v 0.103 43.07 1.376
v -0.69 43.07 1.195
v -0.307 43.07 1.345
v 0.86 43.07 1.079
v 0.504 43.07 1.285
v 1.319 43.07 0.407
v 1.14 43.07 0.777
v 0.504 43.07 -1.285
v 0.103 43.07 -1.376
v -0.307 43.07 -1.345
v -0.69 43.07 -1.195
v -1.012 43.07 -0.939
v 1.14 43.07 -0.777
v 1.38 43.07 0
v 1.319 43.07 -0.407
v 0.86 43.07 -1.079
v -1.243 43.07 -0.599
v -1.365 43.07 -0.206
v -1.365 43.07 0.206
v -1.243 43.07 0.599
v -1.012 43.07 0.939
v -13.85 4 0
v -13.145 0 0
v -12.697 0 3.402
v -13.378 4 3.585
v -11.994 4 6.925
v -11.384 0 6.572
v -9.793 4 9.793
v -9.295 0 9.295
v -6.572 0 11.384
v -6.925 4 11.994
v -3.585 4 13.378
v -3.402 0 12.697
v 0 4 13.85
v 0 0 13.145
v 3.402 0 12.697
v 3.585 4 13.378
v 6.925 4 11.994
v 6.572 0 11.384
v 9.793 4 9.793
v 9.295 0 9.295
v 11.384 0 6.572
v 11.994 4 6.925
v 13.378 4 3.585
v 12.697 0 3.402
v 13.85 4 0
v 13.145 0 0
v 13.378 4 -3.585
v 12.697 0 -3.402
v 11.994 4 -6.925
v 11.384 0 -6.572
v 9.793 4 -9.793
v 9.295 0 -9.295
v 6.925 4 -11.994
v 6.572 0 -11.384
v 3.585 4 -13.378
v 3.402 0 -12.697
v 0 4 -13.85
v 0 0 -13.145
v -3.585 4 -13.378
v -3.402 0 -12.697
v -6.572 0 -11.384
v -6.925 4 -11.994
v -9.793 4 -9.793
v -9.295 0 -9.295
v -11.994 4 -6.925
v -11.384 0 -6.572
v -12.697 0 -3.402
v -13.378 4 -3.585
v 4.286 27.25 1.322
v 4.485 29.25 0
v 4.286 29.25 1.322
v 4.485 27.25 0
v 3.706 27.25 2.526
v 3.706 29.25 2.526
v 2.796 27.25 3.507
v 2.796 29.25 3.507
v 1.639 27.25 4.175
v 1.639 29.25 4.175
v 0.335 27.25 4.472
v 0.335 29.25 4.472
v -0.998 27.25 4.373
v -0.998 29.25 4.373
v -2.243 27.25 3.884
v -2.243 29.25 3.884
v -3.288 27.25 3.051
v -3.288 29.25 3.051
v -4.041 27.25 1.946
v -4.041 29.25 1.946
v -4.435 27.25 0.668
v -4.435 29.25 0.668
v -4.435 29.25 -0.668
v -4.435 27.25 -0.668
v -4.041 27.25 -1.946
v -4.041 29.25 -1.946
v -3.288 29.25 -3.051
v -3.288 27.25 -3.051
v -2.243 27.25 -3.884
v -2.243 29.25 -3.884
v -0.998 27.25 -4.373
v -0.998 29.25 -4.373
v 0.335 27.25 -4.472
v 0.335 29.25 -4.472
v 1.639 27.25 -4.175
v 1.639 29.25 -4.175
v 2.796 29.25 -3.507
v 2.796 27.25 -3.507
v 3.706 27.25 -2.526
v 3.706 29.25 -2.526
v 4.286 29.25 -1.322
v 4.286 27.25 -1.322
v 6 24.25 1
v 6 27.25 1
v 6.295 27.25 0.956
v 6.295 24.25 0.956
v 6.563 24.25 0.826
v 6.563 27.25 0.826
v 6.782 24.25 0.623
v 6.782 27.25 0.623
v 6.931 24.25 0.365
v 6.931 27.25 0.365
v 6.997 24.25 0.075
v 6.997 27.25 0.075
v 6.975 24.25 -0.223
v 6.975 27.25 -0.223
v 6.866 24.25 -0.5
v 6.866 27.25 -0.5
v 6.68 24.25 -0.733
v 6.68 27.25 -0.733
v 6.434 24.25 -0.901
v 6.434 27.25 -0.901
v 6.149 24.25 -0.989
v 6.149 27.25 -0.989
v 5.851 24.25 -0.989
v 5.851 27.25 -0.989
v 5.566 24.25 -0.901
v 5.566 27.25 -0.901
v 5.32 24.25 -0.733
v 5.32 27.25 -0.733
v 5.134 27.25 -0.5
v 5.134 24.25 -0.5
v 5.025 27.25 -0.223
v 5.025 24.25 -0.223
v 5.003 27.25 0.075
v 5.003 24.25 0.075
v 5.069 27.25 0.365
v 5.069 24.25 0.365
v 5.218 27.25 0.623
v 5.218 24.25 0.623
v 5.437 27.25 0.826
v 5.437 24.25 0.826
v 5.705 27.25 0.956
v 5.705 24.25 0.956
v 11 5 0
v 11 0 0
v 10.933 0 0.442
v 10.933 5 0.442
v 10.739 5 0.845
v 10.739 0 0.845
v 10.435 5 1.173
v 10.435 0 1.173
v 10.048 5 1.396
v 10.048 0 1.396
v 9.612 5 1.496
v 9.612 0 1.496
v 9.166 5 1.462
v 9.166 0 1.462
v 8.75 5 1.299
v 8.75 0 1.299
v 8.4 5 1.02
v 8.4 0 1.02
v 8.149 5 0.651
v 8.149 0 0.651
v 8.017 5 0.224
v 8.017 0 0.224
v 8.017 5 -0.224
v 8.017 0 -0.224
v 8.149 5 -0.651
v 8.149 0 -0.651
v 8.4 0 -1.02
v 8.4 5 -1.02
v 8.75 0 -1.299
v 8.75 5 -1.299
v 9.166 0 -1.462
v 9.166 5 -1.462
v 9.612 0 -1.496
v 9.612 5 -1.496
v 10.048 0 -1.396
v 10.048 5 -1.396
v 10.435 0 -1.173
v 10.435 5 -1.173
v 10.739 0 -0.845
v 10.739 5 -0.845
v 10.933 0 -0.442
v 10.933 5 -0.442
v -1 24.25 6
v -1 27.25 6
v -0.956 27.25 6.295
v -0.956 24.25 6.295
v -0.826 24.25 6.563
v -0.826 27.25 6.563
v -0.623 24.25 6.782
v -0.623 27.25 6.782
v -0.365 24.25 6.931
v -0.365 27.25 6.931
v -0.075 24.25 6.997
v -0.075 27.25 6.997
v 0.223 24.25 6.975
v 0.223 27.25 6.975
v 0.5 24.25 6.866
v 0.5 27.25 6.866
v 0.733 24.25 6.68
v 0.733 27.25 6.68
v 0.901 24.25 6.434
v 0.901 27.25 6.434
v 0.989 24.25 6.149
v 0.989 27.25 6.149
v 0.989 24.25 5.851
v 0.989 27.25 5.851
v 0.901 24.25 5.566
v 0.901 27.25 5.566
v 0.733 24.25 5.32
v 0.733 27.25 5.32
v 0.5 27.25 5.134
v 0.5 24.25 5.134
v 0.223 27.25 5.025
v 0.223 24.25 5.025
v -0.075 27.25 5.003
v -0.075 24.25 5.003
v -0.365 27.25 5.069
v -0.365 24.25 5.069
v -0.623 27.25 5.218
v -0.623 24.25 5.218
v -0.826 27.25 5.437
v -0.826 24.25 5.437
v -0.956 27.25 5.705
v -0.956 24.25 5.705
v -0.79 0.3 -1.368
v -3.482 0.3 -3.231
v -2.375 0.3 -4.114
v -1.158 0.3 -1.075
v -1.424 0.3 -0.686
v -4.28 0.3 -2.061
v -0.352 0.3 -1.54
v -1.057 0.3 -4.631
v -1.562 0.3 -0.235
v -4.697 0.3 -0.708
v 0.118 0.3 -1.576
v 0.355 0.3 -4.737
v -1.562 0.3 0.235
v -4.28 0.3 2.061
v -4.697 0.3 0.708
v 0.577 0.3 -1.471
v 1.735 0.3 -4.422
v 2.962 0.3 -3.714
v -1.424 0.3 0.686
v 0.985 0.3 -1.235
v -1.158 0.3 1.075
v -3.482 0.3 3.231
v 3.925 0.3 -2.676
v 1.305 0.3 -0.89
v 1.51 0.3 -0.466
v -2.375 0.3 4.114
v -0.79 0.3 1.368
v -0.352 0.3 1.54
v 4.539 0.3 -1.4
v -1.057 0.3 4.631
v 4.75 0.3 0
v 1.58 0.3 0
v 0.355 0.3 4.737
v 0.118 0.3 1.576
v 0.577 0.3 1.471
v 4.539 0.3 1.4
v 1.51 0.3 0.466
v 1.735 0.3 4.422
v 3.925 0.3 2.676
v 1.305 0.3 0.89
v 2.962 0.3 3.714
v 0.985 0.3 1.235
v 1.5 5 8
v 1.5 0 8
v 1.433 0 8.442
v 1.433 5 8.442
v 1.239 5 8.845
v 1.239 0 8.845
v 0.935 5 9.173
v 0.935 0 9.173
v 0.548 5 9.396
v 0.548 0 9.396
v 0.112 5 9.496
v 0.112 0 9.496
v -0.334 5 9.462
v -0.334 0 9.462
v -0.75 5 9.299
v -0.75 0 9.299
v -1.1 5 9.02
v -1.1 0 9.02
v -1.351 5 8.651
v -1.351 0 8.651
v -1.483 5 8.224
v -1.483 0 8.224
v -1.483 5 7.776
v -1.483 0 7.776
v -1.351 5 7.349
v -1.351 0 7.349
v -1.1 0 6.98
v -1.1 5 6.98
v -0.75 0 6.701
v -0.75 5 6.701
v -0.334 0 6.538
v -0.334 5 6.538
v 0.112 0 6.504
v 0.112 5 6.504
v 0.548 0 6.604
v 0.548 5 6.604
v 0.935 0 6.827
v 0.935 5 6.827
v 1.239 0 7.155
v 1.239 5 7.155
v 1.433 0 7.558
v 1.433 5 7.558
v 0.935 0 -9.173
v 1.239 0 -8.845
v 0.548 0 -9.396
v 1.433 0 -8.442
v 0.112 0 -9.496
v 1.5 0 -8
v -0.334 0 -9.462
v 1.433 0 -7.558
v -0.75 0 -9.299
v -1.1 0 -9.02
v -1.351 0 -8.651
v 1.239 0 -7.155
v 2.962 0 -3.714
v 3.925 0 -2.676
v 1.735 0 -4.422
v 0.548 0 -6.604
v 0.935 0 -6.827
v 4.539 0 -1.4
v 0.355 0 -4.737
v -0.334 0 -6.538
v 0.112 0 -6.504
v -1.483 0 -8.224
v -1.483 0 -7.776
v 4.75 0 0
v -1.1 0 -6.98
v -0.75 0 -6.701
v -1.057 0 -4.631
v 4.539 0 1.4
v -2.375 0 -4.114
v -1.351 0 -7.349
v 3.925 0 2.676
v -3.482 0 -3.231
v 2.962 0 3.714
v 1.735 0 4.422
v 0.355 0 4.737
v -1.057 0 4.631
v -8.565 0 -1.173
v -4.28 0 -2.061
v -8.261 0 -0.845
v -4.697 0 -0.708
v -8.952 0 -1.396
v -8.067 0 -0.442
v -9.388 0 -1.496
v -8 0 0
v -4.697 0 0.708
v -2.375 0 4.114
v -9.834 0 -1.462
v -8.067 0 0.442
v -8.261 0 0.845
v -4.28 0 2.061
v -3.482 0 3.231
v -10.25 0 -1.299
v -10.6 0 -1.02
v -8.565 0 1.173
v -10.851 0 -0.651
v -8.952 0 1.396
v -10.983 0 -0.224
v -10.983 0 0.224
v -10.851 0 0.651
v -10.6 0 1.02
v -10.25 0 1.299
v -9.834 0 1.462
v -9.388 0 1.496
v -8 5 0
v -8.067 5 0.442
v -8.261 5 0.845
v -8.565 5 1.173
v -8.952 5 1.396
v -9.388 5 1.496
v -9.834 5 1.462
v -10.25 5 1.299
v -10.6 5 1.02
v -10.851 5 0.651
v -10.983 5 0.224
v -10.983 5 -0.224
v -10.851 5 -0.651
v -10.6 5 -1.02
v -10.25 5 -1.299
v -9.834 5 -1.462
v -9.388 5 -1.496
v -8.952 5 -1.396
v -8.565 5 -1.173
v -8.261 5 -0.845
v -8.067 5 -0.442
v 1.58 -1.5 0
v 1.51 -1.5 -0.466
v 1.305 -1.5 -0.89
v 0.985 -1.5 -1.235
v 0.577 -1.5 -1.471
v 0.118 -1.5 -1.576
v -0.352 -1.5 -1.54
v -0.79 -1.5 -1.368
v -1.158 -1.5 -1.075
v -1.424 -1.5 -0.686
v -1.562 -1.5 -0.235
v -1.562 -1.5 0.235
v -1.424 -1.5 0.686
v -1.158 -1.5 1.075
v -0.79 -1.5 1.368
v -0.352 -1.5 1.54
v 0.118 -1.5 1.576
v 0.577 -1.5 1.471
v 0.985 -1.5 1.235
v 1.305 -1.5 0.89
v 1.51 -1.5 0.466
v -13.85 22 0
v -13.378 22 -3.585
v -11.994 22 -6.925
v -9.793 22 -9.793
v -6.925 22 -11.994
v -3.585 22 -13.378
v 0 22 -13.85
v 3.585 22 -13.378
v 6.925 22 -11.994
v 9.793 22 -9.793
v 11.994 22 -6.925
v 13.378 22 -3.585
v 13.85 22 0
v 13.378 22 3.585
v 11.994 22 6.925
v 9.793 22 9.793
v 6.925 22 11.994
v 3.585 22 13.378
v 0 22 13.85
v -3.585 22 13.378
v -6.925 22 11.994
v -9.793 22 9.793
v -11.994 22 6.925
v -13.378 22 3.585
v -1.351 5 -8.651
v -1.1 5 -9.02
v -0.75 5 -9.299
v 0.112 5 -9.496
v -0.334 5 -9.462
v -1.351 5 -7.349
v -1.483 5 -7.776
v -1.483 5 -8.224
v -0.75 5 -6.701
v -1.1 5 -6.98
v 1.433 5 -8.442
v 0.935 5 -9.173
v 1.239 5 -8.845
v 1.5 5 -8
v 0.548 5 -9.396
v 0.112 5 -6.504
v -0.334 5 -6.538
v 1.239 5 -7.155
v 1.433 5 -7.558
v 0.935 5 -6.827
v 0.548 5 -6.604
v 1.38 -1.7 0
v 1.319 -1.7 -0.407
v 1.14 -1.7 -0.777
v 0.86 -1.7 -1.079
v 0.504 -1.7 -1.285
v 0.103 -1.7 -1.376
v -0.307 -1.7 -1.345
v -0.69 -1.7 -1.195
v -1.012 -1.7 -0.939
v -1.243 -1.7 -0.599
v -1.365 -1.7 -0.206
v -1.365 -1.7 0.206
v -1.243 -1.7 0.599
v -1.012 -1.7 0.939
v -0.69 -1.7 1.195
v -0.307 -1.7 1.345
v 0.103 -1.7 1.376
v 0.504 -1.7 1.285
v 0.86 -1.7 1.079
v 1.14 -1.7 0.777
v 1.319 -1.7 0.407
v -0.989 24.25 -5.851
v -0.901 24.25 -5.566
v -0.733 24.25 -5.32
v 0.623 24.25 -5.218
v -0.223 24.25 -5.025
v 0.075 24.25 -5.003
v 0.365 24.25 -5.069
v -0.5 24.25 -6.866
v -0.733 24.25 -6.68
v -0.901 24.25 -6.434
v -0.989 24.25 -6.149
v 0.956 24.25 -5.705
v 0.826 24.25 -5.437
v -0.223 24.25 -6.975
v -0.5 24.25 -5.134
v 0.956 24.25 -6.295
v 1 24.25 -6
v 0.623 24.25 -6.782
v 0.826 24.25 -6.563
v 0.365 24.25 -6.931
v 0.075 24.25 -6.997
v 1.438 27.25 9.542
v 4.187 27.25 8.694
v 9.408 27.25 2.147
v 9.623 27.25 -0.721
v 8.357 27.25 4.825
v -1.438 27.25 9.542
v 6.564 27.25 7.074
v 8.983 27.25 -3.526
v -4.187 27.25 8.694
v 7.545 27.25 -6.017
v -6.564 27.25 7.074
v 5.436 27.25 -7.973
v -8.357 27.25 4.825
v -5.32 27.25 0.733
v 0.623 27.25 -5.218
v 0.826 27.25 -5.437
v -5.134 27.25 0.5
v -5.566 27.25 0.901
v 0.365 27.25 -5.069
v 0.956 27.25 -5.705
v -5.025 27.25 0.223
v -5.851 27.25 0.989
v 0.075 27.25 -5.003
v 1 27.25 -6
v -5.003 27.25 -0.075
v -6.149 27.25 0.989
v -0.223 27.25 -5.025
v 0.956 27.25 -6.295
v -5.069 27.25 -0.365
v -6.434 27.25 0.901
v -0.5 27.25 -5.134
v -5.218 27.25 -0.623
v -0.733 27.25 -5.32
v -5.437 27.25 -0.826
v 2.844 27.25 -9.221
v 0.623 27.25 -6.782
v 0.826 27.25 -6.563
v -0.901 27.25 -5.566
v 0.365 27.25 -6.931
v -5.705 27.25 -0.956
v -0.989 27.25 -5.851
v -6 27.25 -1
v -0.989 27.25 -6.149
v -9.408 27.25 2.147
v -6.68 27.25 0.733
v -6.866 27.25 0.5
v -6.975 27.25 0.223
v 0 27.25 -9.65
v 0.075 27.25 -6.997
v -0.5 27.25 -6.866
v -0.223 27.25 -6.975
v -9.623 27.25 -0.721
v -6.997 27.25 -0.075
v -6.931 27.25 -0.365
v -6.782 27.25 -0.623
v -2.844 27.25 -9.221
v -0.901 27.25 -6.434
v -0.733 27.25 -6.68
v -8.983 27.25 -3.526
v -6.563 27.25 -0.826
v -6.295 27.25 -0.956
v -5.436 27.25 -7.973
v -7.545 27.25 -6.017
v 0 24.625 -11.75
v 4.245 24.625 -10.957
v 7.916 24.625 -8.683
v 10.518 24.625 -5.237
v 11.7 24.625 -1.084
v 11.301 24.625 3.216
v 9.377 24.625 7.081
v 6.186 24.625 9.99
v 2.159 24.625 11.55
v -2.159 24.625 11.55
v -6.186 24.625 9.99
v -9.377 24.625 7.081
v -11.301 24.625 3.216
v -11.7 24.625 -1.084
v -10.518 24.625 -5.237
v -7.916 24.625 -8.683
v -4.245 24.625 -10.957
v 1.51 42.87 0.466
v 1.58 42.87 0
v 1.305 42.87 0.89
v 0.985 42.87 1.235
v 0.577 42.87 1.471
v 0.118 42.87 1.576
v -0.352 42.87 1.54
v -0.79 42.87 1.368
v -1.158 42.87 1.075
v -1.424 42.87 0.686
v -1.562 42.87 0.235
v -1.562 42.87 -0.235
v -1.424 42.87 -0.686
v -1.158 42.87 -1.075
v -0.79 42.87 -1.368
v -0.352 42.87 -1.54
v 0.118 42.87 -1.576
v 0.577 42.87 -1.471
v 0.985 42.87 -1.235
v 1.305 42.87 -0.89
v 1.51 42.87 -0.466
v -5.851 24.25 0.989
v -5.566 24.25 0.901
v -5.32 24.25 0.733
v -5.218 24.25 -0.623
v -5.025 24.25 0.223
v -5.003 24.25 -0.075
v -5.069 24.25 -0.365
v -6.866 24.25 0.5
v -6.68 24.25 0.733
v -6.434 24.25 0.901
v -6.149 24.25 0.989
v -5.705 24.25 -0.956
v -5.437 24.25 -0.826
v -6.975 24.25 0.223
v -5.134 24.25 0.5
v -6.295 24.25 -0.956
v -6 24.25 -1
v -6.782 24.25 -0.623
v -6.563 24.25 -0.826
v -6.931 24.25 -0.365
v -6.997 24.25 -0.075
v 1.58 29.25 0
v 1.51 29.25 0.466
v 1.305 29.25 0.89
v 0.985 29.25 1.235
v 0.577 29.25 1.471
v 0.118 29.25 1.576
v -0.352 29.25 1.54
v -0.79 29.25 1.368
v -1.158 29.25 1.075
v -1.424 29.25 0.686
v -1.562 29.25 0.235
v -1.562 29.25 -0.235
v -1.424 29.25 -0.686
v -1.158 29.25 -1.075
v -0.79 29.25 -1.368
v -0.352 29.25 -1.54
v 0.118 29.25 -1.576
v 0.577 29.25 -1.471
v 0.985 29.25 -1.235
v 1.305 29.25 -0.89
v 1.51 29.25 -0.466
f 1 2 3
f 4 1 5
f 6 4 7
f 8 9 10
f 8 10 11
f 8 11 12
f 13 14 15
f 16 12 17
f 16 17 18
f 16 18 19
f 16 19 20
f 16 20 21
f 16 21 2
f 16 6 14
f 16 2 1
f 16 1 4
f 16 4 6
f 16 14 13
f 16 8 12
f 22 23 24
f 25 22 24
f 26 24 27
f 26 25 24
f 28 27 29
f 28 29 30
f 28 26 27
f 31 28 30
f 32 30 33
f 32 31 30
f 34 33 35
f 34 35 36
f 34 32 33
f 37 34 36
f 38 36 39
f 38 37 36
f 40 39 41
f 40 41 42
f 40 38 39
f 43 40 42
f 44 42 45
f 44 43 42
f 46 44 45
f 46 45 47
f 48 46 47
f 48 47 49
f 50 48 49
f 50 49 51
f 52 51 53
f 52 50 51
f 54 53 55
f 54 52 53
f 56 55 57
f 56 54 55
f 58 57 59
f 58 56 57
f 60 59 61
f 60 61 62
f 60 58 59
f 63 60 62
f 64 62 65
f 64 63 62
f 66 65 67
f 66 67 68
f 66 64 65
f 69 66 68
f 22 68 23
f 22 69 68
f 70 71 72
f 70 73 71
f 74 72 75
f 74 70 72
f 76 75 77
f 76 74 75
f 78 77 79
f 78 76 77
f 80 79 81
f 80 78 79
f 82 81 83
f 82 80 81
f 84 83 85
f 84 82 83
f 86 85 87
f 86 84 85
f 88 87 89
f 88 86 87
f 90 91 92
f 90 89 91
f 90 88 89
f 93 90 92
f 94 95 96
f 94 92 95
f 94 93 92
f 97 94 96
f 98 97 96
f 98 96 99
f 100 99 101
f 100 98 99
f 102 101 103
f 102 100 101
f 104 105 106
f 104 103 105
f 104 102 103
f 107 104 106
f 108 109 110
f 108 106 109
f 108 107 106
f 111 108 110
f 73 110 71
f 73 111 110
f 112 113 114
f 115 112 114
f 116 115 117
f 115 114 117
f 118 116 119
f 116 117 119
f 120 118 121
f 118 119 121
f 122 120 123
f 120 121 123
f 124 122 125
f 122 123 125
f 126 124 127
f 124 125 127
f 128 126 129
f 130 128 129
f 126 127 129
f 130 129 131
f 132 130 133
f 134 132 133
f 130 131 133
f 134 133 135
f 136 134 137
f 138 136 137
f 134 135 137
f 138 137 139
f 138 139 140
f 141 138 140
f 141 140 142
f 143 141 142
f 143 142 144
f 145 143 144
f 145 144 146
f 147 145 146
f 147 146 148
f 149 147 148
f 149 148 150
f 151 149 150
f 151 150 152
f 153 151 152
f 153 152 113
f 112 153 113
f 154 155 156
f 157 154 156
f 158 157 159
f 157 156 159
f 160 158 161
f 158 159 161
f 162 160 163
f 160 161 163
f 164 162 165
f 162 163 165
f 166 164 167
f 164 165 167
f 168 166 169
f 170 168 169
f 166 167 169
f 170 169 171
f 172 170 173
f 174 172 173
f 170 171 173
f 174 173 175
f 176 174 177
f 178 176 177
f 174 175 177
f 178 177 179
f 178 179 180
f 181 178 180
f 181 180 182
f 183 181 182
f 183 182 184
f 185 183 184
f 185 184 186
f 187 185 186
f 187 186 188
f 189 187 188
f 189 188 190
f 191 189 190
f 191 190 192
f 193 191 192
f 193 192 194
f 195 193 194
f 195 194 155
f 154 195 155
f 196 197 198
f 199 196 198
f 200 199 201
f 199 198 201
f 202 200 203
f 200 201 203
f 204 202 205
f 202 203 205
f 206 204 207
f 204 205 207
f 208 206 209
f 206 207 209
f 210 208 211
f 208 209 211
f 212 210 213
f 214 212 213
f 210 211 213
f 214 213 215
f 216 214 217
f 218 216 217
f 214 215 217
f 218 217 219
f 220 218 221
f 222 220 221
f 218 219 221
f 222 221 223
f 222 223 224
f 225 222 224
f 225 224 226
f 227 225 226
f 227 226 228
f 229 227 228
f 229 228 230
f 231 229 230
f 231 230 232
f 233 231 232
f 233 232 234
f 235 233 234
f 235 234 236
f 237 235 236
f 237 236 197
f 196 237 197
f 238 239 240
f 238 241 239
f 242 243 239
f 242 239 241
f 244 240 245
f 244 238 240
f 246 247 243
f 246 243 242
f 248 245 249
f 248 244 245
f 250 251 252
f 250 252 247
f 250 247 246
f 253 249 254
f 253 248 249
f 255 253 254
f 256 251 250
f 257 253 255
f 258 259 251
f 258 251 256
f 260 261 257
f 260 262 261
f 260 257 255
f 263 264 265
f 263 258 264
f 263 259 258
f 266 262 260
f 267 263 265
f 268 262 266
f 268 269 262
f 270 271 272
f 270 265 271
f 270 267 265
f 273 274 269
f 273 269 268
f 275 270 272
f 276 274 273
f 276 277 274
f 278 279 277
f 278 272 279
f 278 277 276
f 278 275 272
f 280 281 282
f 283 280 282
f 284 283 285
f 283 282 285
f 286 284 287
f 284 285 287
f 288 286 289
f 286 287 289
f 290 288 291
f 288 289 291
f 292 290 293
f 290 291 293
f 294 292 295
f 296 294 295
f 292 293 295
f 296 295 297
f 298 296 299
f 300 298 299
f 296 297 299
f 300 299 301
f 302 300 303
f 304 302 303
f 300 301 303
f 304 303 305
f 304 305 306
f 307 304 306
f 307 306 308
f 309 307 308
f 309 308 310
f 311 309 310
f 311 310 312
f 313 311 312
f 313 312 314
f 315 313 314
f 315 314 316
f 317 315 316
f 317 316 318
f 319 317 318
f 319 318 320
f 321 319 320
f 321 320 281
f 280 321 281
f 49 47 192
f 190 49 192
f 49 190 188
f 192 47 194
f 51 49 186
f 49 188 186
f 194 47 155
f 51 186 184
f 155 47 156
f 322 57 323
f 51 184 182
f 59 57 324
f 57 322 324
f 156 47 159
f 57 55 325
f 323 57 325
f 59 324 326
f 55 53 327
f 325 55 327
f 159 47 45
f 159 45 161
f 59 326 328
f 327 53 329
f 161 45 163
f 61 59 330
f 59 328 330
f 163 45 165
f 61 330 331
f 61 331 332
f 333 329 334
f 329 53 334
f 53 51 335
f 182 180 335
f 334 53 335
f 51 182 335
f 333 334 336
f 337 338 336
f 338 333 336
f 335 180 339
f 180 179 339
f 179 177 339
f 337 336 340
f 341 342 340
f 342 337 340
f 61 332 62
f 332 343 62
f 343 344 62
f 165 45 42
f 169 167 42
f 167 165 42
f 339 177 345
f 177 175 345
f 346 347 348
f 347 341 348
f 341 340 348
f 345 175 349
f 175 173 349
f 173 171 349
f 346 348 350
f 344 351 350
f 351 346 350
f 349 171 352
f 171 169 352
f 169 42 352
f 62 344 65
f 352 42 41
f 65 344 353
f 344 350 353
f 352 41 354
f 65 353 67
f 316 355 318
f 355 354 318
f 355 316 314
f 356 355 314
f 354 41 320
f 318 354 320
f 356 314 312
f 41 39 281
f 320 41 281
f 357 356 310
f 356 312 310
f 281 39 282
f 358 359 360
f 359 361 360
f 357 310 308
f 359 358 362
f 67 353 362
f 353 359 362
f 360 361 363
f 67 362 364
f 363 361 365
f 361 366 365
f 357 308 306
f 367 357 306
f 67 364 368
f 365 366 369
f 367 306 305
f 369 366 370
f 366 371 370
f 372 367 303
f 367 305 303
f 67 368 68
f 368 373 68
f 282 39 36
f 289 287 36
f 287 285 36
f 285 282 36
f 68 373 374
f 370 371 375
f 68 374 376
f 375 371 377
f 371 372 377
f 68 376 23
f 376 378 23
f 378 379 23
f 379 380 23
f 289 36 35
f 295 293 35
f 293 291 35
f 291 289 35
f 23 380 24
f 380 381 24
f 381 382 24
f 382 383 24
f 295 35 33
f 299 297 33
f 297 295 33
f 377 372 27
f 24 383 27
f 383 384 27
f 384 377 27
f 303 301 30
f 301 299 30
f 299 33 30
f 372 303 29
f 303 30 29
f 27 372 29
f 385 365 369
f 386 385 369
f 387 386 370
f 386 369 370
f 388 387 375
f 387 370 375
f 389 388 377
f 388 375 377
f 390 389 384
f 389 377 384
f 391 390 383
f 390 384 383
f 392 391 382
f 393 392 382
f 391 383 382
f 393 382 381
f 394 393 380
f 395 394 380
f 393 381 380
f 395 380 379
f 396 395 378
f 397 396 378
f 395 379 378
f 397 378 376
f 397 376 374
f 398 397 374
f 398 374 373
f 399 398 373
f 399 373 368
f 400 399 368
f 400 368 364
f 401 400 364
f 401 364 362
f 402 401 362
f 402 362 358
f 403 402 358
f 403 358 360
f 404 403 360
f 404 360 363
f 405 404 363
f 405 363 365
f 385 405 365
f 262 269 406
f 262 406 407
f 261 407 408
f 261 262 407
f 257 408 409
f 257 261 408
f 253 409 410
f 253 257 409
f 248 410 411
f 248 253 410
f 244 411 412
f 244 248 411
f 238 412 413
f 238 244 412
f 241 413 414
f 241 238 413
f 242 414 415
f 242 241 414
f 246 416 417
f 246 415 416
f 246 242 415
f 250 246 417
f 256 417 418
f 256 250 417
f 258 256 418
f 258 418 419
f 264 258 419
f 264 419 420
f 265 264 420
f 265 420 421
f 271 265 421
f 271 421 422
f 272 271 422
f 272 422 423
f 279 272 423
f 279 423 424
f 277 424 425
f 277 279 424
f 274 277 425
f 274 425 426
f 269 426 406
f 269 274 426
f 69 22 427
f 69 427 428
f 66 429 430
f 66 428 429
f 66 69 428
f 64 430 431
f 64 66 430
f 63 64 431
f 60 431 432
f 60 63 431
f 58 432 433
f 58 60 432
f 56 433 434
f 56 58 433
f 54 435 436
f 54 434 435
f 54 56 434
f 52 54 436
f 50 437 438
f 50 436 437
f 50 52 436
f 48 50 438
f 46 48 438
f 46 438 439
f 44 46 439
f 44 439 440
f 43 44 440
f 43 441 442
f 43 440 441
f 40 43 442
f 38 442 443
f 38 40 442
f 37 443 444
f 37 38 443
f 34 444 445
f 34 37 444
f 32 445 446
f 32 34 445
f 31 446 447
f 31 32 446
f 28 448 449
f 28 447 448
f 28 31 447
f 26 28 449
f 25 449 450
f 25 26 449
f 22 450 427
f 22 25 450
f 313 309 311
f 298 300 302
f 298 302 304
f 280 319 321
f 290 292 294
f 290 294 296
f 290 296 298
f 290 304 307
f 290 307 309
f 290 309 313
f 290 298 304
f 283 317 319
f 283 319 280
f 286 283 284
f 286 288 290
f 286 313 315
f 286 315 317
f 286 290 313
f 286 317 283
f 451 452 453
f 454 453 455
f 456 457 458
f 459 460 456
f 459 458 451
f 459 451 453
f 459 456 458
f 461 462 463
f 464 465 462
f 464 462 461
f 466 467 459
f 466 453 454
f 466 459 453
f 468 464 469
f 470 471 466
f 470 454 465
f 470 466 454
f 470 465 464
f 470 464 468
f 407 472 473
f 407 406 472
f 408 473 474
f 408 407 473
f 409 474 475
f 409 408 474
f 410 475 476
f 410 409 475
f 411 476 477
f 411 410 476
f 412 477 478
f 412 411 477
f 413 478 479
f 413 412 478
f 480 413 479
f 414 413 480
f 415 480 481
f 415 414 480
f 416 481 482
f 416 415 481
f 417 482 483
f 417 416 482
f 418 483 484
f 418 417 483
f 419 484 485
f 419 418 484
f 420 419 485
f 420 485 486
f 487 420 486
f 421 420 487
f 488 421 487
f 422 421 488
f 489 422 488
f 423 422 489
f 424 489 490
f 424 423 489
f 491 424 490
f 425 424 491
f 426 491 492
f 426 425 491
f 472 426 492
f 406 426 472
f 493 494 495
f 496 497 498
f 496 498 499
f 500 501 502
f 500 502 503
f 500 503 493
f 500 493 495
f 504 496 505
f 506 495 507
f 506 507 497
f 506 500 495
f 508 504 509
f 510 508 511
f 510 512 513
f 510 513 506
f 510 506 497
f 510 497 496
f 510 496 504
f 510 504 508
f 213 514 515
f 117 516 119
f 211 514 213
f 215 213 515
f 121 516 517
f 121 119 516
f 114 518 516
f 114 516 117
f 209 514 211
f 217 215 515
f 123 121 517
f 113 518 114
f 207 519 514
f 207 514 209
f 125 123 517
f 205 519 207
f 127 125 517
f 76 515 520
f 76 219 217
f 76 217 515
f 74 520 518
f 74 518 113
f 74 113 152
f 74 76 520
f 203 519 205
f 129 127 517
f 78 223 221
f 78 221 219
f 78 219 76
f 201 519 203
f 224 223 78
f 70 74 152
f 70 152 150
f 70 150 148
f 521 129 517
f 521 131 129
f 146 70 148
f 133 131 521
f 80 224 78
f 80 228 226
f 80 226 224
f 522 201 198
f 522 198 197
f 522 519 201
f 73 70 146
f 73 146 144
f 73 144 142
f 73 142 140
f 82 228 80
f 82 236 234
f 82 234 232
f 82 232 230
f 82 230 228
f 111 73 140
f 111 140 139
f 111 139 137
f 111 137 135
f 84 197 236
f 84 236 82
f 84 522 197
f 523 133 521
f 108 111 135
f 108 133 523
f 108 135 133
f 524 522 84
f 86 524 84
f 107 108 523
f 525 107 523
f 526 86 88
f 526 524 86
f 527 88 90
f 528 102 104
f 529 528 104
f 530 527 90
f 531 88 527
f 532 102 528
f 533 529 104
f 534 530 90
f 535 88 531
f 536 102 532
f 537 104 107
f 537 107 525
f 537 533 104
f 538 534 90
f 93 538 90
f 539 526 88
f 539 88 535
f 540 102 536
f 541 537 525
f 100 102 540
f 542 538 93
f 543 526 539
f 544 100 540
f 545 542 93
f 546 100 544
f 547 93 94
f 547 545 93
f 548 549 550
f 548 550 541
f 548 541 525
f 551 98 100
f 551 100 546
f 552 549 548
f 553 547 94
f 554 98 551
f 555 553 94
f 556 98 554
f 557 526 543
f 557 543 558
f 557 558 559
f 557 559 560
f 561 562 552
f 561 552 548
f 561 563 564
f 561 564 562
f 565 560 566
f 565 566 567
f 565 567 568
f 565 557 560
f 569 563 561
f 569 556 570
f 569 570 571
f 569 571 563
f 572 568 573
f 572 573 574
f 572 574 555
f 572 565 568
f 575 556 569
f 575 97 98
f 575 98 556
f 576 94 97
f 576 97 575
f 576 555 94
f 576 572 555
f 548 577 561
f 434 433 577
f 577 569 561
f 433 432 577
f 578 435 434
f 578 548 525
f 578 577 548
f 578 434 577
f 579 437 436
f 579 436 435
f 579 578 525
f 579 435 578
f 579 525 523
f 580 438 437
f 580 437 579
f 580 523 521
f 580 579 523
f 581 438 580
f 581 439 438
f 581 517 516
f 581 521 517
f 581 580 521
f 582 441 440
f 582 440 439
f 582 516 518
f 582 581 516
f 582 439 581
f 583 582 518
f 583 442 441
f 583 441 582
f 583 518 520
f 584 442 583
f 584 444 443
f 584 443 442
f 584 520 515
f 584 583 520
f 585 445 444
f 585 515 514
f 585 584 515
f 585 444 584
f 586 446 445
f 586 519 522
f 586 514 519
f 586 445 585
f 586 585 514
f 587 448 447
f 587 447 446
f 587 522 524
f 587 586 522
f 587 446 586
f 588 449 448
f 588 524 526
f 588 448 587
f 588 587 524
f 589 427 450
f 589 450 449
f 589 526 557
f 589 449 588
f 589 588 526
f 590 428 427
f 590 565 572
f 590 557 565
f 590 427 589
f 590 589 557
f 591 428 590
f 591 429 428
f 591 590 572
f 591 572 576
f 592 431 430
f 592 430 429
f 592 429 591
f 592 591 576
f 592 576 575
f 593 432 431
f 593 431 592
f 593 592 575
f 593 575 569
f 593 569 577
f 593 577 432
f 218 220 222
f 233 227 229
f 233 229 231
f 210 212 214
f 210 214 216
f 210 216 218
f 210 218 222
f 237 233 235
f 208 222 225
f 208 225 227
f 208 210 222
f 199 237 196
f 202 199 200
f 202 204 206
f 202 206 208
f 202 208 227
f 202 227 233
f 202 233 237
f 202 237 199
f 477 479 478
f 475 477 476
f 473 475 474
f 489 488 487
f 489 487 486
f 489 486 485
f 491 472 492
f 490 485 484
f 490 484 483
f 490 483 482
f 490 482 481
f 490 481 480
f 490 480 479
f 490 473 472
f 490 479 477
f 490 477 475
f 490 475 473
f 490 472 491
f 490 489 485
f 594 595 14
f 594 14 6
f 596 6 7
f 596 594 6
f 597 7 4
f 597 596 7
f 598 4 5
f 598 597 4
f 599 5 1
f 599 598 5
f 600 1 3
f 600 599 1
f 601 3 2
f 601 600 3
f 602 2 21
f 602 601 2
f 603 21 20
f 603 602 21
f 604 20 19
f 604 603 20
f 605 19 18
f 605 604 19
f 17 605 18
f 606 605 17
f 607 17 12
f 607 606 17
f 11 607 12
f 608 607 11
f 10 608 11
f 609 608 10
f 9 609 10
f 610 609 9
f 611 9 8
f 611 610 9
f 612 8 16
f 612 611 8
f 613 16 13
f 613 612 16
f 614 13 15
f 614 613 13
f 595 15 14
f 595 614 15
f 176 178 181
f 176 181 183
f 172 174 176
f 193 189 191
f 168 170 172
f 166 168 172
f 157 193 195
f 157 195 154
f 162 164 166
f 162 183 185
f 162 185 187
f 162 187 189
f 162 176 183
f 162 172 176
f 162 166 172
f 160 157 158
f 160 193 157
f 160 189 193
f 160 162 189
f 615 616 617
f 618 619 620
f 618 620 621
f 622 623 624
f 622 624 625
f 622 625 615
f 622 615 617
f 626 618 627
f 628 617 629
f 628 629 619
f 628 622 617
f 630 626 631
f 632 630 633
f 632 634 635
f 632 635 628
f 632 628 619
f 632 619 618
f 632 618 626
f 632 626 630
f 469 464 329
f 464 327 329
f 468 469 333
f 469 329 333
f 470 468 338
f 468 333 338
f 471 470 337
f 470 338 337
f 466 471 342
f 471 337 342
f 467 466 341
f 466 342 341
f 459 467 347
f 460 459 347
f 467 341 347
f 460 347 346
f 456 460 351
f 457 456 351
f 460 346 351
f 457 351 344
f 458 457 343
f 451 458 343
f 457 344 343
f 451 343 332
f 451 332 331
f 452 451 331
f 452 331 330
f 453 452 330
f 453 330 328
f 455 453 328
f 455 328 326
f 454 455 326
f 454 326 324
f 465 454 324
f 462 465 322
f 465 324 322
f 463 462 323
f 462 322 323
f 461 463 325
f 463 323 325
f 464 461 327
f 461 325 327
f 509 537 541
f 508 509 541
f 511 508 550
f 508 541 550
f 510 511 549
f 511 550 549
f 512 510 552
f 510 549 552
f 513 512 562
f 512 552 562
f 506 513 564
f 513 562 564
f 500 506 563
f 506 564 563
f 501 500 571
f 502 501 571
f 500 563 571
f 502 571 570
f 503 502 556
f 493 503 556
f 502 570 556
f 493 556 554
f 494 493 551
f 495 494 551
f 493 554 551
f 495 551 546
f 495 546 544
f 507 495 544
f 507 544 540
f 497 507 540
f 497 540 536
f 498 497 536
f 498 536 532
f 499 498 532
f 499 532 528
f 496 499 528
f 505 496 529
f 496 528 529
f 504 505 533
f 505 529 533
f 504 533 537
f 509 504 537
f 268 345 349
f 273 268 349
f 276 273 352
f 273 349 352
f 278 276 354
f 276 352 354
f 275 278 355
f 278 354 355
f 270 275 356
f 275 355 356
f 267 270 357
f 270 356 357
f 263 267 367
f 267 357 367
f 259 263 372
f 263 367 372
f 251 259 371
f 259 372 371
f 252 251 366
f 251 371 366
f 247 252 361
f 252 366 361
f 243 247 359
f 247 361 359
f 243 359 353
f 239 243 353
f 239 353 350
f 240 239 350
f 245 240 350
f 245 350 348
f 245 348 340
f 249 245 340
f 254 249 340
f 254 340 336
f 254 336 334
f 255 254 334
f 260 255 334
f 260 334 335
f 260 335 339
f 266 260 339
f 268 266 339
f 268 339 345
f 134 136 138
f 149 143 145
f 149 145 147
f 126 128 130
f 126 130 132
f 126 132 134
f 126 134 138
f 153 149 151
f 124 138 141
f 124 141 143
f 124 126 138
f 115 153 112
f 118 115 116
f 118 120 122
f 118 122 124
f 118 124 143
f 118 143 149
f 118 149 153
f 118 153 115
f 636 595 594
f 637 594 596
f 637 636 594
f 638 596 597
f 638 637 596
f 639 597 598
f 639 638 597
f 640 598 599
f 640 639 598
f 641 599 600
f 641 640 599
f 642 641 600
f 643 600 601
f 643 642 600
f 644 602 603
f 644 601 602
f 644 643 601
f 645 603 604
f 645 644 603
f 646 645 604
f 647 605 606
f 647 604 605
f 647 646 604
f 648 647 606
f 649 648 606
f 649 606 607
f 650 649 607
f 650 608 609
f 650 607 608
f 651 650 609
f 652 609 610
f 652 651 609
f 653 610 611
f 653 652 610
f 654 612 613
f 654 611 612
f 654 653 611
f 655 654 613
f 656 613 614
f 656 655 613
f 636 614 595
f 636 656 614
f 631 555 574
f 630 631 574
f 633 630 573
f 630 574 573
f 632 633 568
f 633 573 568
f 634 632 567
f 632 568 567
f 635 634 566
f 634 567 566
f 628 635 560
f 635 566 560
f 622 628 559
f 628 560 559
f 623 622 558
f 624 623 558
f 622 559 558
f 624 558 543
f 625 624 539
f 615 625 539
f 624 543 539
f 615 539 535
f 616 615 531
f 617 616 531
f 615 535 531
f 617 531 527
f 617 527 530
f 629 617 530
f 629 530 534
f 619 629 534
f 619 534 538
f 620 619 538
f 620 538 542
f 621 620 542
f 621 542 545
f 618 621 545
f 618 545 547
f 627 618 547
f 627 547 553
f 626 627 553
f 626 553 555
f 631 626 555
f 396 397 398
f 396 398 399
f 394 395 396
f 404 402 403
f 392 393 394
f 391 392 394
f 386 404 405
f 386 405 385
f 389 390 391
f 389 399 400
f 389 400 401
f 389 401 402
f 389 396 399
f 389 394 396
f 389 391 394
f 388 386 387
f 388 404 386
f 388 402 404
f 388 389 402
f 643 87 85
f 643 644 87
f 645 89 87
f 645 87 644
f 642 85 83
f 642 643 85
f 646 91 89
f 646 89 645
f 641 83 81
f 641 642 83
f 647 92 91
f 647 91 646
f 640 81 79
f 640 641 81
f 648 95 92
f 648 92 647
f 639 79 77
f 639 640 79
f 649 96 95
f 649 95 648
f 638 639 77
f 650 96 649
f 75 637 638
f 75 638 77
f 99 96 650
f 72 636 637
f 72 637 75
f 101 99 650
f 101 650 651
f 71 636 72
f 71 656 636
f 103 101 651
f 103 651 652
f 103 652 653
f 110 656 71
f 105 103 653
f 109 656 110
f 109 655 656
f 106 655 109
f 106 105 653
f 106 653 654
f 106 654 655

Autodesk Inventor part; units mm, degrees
ref_plane "YZ Plane" through (0, 0, 0) normal (1, 0, 0) x (0, 1, 0)
ref_plane "XZ Plane" through (0, 0, 0) normal (0, 1, 0) x (-1, 0, 0)
ref_plane "XY Plane" through (0, 0, 0) normal (0, 0, 1) x (1, 0, 0)
sketch "Sketch1" plane through (0, 0, 0) normal (0, 1, 0) x (-1, 0, 0)
  circle A0 centre (0, 0) radius 13.85
  dimension "d0" = 27.7
extrude "Extrusion1" add sketch "Sketch1" along normal blind 22
sketch "Sketch2" plane through (0, 0, 0) normal (1, 0, 0) x (0, 1, 0)
  line L0 (22, -13.85) -> (22, 13.85) projected
  line L1 (-4.4, 0) -> (26.4, 0) projected
  line L2 (22, -13.85) -> (27.25, -9.65)
  line L3 (27.25, -9.65) -> (27.25, 0)
  line L4 (22, 0) -> (22, -13.85)
  line L5 (27.25, 0) -> (22, 0)
  point P0 (0, 0)
  dimension "d3" = 5.25
  dimension "d6" = 9.65
revolve "Revolution1" add sketch "Sketch2" angle 360 about axis through (0, -10, 0) along (0, 1, 0)
chamfer "Chamfer1" distance 4 angle 10 1 edges at (13.85, 0, 0) measured on face at (1.6986, 14.6667, -13.7454)
sketch "Sketch3" plane through (0, 27.25, 0) normal (0, 1, 0) x (1, 0, 0)
  circle A0 centre (0, 0) radius 1.58
  dimension "d10" = 3.16
extrude "Extrusion2" add sketch "Sketch3" along normal blind 15.82
sketch "Sketch4" plane through (0, 27.25, 0) normal (0, 1, 0) x (1, 0, 0)
  circle A0 centre (0, 0) radius 4.485
  dimension "d13" = 8.97
extrude "Extrusion3" add sketch "Sketch4" along normal blind 2
sketch "Sketch5" plane through (0, 27.25, 0) normal (0, 1, 0) x (1, 0, 0)
  line L0 (0, 19.39) -> (0, -19.39) projected
  circle A0 centre (0, 6) radius 1
  point P0 (0, 0)
  dimension "d16" = 6
  dimension "d17" = 2
extrude "Extrusion4" cut sketch "Sketch5" against normal blind 3
thread "Thread1" size "M2x0.4" class "6H" standard "ANSI Metric M Profile" full length
pattern_circular "Circular Pattern1" count 4 over 360 about axis through (0, -10, 0) along (0, 1, 0) of "Extrusion4"
sketch "Sketch6" plane through (0, 0, 0) normal (0, -1, 0) x (1, 0, 0)
  line L0 (-19.39, 0) -> (19.39, 0) projected
  line L1 (0, -19.39) -> (0, 19.39) projected
  circle A0 centre (9.5, 0) radius 1.5
  circle A1 centre (0, 8) radius 1.5
  circle A2 centre (-9.5, 0) radius 1.5
  circle A3 centre (0, -8) radius 1.5
  point P0 (0, 0)
  dimension "d25" = 9.5
  dimension "d26" = 8
  dimension "d27" = 3
extrude "Extrusion5" cut sketch "Sketch6" against normal blind 5
thread "Thread2" size "M3x0.5" class "6H" standard "ANSI Metric M Profile" full length
thread "Thread3" size "M3x0.5" class "6H" standard "ANSI Metric M Profile" full length
thread "Thread4" size "M3x0.5" class "6H" standard "ANSI Metric M Profile" full length
thread "Thread5" size "M3x0.5" class "6H" standard "ANSI Metric M Profile" full length
sketch "Sketch7" plane through (0, 0, 0) normal (0, -1, 0) x (1, 0, 0)
  circle A0 centre (0, 0) radius 4.75
  dimension "d38" = 9.5
extrude "Extrusion6" cut sketch "Sketch7" against normal blind 0.3
sketch "Sketch8" plane through (0, 0.3, 0) normal (0, -1, 0) x (1, 0, 0)
  circle A0 centre (0, 0) radius 1.58 projected
extrude "Extrusion7" add sketch "Sketch8" along normal blind 2
chamfer "Chamfer2" distance 0.2 angle 45 2 edges at (-1.58, -1.7, 0) (-1.58, 43.07, 0)
properties part number "Brushless Motor"
